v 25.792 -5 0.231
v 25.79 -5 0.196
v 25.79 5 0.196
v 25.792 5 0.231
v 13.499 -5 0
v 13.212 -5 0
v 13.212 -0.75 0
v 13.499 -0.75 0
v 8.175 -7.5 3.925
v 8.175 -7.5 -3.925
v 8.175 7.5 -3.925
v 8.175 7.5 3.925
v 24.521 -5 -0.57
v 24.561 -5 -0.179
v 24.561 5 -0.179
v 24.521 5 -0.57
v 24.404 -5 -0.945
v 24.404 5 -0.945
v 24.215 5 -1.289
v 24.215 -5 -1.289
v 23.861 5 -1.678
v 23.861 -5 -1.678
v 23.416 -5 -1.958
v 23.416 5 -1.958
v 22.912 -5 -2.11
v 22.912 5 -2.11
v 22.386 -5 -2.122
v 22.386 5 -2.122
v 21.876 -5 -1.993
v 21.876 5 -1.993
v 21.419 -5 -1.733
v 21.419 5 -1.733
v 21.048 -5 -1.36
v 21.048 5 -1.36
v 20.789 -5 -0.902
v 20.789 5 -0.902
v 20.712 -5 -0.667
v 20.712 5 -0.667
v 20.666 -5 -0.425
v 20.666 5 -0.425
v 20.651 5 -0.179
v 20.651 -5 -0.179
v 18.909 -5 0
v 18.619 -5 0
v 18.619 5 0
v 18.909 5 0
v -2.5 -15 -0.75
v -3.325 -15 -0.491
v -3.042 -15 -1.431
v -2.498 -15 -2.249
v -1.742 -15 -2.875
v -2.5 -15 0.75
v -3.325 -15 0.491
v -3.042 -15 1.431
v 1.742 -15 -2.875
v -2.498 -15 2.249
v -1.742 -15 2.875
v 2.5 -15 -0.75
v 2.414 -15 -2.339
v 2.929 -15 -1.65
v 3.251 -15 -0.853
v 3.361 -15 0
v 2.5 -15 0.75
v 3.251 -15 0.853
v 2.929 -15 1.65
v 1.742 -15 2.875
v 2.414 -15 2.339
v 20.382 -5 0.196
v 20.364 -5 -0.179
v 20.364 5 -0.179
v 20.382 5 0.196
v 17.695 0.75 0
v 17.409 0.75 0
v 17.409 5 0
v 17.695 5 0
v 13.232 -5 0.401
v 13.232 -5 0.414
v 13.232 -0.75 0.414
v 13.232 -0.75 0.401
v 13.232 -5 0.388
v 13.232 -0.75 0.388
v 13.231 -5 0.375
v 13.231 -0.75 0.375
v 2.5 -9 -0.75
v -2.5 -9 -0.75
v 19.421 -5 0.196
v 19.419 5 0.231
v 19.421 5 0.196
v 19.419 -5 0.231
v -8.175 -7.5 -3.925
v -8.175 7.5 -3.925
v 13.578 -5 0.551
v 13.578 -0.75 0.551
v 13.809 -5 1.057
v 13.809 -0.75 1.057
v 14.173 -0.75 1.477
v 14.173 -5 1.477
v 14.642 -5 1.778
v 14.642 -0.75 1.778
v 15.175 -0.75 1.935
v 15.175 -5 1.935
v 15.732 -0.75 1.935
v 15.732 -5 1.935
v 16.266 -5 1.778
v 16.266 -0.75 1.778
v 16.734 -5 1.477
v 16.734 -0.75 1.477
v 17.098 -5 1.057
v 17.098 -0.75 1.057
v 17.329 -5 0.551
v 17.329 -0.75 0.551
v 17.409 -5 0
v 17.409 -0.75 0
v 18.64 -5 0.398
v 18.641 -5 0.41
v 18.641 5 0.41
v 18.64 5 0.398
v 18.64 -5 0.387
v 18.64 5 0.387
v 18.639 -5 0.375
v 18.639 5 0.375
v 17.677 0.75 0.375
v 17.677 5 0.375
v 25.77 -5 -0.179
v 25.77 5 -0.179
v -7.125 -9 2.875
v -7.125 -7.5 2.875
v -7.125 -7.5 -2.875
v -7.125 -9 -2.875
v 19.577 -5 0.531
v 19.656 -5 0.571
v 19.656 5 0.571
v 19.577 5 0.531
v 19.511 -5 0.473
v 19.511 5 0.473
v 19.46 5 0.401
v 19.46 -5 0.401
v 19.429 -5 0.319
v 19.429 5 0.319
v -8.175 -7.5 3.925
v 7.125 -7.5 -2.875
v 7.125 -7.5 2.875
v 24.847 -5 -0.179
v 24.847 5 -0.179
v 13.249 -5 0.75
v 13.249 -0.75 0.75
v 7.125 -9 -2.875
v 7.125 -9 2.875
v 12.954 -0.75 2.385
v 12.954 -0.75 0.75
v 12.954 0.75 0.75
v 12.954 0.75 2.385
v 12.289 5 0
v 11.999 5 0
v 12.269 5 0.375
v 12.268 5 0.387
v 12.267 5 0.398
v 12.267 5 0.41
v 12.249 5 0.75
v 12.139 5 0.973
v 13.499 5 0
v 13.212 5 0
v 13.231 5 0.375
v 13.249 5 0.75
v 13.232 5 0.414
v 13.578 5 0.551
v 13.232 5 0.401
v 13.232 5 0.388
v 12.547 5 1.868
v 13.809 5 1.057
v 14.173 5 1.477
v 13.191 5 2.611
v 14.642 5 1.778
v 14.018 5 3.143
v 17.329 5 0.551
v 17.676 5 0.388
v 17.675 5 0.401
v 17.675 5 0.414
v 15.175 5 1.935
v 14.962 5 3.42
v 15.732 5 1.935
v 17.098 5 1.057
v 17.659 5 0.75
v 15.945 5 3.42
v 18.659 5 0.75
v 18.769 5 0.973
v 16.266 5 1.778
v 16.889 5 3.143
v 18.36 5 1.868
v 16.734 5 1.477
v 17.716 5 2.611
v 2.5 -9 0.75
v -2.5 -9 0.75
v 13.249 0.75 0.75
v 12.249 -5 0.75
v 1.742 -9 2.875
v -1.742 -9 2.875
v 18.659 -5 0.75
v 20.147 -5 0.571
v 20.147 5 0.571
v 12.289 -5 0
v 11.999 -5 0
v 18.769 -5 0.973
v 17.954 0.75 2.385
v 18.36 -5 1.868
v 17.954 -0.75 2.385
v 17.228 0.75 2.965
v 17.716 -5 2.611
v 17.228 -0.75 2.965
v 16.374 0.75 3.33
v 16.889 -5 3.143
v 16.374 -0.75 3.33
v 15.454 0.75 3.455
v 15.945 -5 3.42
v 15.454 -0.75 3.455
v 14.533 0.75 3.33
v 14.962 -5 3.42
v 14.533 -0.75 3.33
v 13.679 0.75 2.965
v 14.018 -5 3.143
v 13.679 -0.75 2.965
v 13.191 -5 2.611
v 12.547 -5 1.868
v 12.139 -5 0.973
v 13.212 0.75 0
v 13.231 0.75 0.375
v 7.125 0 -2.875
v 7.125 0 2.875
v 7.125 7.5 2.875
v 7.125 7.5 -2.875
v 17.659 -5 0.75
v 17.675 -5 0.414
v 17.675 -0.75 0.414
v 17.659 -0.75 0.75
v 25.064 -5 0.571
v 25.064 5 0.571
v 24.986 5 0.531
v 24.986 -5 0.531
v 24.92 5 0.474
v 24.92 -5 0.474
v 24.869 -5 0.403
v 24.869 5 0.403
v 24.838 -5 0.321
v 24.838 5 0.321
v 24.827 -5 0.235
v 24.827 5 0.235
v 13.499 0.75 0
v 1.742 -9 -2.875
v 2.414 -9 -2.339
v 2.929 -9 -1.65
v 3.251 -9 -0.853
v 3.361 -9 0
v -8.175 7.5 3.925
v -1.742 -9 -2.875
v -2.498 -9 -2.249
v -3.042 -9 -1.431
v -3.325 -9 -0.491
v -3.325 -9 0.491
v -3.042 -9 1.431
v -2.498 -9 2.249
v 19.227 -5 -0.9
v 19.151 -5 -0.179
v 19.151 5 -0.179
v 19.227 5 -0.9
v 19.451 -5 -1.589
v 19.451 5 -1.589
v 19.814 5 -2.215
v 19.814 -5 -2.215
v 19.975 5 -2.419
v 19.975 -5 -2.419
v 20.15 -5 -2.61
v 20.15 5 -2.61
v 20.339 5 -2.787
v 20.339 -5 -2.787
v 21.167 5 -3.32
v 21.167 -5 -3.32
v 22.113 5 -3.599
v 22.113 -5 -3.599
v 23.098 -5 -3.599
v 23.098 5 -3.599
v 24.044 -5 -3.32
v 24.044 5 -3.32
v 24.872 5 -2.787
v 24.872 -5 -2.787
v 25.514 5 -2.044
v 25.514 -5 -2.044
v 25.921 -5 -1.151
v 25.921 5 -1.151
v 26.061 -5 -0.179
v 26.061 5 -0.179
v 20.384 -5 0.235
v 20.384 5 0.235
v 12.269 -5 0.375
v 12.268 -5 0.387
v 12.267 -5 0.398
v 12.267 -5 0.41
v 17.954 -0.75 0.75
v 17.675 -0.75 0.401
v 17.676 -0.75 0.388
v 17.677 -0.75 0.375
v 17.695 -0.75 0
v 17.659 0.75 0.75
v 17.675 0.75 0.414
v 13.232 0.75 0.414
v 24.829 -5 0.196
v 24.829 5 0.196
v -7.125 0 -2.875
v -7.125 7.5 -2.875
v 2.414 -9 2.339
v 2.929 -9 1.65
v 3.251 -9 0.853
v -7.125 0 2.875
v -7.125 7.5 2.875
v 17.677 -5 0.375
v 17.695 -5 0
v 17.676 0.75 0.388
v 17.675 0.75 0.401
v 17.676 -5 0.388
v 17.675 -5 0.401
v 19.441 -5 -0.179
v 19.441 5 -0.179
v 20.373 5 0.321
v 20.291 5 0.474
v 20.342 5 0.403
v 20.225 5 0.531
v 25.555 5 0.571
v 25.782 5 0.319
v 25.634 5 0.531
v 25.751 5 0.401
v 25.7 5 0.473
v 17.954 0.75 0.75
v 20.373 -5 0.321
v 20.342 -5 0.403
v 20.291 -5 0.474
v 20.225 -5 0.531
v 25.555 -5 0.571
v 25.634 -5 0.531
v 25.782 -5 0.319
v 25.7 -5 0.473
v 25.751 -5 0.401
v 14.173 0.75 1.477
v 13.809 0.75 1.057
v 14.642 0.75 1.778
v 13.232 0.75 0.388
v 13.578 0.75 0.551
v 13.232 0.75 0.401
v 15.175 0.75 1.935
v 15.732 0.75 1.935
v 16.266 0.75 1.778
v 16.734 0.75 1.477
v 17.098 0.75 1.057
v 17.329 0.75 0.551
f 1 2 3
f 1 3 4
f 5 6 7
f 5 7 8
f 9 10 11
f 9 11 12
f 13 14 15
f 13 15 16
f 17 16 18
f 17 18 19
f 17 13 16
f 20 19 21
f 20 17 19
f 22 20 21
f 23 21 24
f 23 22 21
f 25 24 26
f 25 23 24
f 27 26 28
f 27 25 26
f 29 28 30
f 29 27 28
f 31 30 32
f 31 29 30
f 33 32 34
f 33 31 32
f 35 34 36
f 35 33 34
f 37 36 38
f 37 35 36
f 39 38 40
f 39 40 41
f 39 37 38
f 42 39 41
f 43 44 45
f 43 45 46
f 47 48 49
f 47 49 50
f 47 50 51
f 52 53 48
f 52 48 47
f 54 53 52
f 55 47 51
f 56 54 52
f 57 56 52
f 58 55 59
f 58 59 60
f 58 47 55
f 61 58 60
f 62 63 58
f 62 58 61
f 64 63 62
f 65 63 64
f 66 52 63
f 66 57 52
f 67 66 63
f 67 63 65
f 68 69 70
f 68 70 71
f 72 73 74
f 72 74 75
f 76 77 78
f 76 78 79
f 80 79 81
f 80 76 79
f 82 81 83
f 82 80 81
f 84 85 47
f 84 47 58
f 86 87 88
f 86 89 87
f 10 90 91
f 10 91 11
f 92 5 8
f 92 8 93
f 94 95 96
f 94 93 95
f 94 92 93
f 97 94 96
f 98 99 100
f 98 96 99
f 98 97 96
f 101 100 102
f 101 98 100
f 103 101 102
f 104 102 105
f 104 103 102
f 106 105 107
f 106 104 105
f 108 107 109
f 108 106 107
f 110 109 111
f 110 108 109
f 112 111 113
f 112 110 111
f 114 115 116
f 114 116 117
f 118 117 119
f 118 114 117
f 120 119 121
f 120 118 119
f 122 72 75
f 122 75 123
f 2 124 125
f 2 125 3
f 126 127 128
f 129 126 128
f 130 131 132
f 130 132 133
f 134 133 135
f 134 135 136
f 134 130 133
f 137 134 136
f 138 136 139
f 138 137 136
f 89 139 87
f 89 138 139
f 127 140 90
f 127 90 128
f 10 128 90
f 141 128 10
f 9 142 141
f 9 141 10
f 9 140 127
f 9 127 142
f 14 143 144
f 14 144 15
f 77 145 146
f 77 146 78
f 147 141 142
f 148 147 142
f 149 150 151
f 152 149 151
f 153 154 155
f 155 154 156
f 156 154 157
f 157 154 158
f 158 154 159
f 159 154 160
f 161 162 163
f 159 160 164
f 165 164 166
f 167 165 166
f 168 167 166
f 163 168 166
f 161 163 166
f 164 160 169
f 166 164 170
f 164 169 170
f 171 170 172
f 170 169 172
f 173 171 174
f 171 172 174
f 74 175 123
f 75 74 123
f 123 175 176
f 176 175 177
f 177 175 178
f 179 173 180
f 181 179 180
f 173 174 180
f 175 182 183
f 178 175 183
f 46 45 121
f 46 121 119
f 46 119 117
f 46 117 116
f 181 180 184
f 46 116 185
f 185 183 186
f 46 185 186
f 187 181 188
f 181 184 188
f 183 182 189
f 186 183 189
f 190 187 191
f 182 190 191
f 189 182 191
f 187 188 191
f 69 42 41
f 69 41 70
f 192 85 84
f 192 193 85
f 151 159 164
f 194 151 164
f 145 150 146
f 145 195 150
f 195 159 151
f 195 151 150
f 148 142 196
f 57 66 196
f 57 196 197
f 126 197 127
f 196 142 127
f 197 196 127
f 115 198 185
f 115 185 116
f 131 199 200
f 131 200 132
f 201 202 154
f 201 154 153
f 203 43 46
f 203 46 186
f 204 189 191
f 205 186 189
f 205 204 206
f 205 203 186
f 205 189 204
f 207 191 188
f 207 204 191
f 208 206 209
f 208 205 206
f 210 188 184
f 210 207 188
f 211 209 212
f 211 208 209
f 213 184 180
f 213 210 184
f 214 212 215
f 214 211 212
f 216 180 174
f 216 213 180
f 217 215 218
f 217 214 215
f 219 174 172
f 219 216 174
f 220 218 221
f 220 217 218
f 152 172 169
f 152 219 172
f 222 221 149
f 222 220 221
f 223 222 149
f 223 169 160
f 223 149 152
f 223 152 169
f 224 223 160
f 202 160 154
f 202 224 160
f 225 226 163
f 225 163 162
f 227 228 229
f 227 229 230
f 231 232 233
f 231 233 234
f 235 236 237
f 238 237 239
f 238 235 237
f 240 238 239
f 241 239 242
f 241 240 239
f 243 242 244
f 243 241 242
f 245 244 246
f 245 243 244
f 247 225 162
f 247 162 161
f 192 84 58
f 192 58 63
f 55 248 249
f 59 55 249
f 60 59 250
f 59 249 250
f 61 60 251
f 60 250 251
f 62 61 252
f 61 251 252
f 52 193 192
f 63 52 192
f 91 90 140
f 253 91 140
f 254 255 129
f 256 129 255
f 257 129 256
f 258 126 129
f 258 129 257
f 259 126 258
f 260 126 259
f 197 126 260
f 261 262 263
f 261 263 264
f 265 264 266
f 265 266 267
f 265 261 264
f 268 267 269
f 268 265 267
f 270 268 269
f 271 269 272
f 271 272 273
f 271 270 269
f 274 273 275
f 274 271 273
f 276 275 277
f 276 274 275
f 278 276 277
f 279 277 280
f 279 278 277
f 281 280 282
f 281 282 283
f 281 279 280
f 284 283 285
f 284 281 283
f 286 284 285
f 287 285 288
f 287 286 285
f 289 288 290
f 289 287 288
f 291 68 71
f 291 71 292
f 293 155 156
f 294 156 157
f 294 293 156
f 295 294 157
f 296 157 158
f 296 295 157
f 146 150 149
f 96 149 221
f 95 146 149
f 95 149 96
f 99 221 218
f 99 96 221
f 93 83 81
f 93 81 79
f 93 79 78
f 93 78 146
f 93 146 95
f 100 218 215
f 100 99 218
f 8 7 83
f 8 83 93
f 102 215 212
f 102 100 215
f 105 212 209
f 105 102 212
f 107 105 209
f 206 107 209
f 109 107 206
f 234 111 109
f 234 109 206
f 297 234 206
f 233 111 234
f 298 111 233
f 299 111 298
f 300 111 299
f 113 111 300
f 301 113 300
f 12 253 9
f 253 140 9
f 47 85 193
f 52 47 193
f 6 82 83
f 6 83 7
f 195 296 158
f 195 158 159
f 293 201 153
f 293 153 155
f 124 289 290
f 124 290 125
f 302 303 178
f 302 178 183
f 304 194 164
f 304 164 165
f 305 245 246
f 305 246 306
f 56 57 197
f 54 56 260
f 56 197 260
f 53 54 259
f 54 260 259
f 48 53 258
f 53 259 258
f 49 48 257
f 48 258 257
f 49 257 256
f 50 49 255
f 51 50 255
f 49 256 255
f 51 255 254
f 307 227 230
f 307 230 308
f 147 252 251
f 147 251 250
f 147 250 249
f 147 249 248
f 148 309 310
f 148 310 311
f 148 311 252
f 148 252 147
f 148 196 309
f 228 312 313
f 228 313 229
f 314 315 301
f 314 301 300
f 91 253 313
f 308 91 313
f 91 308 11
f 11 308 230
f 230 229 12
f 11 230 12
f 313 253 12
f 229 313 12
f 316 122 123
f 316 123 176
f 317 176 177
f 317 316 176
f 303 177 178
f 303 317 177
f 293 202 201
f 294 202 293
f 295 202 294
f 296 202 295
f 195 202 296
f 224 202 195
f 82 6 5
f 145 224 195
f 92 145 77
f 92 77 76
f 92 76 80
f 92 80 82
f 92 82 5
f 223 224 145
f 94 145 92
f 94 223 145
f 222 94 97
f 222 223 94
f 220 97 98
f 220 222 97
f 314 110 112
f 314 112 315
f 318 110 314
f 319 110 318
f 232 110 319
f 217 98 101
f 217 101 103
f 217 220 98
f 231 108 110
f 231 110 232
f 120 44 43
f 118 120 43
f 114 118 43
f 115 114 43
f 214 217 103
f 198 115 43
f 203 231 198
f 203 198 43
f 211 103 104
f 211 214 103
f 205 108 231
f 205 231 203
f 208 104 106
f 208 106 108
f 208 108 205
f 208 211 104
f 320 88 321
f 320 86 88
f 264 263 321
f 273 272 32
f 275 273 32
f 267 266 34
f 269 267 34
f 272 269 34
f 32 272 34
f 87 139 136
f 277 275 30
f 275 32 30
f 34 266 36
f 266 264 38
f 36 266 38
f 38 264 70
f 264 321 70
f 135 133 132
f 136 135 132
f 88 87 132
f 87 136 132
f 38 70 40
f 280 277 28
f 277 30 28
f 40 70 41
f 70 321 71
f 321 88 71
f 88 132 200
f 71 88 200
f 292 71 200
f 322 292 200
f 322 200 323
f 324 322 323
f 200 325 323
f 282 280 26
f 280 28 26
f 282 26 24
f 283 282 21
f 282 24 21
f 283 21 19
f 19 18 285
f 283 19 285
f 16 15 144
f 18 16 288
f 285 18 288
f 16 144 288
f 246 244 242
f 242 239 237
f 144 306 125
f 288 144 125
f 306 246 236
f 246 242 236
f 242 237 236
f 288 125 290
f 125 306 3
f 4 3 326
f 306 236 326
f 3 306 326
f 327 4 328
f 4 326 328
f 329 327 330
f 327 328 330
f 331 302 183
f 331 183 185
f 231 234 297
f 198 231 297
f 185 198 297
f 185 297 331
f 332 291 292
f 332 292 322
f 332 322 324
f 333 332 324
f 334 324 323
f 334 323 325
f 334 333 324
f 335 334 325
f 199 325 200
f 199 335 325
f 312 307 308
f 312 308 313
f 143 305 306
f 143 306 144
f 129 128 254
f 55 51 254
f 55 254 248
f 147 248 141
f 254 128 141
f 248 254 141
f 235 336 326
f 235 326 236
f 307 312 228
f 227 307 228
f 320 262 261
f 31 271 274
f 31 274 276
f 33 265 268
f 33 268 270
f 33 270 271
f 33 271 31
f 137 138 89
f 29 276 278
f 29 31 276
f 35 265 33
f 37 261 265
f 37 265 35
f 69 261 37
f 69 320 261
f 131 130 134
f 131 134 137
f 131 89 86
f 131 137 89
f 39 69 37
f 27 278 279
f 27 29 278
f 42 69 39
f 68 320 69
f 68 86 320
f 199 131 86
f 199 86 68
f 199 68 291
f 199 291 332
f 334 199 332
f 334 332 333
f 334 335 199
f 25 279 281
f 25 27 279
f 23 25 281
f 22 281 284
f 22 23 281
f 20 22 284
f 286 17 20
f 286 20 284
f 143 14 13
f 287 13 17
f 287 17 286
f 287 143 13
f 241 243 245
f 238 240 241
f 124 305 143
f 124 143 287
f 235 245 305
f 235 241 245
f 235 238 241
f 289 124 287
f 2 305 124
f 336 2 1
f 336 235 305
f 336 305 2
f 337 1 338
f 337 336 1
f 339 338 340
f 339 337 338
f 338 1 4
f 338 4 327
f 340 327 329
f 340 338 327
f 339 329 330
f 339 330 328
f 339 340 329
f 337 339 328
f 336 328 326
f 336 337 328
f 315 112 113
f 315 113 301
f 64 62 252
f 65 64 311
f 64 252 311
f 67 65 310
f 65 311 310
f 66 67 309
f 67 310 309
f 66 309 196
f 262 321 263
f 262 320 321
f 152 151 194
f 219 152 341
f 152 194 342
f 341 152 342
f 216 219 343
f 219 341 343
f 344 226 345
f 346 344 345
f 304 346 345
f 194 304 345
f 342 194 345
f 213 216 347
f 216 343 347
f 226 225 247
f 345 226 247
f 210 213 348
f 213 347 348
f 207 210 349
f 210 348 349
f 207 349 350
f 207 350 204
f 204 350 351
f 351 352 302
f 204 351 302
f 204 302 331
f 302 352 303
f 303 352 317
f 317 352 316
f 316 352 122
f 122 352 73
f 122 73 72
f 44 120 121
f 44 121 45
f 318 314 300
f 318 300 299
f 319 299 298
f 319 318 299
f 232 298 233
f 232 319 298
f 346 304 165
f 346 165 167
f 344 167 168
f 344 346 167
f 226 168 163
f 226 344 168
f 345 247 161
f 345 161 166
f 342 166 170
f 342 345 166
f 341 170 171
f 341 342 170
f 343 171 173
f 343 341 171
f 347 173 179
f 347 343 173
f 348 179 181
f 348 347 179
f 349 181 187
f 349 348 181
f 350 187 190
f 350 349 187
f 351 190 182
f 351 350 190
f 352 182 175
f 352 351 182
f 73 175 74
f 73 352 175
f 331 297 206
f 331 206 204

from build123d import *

# Parameters (mm, degrees)
F0_W     = 16.35
F0_H     = 7.85
F1_DEPTH = 7.5
F0_W_2   = 5
F0_H_2   = 1.5
F2_DEPTH = 9
F3_DEPTH = 15
F4_DEPTH = 5
F5_W     = 5
F5_H     = 1.5
F6_DEPTH = 9.752


with BuildPart() as f1:
    # F0 (on Front) → F1 (new body, symmetric)
    with BuildSketch(Plane.XZ):
        Rectangle(F0_W, F0_H)
        with BuildLine():
            Line((1.7415829263, 2.875), (7.125, 2.875))
            Line((7.125, 2.875), (7.125, -2.875))
            Line((7.125, -2.875), (1.7415829263, -2.875))
            ThreePointArc((1.7415829263, -2.875), (0, -3.3613592622), (-1.7415829263, -2.875))
            Line((-1.7415829263, -2.875), (-7.125, -2.875))
            Line((-7.125, -2.875), (-7.125, 2.875))
            Line((-7.125, 2.875), (-1.7415829263, 2.875))
            ThreePointArc((-1.7415829263, 2.875), (0, 3.3613592622), (1.7415829263, 2.875))
        make_face(mode=Mode.SUBTRACT)
        with BuildLine():
            ThreePointArc((-1.7415829263, -2.875), (0, -3.3613592622), (1.7415829263, -2.875))
            Line((1.7415829263, -2.875), (-1.7415829263, -2.875))
        make_face()
        with BuildLine():
            Line((-1.7415829263, 2.875), (1.7415829263, 2.875))
            ThreePointArc((1.7415829263, 2.875), (0, 3.3613592622), (-1.7415829263, 2.875))
        make_face()
    extrude(amount=F1_DEPTH, both=True)

    # F0 (on Front) → F2 (join)
    with BuildSketch(Plane.XZ):
        with BuildLine():
            Line((7.125, -2.875), (7.125, 2.875))
            Line((7.125, 2.875), (1.7415829263, 2.875))
            ThreePointArc((1.7415829263, 2.875), (2.928551006, 1.6499469975), (3.3613592622, 0))
            ThreePointArc((3.3613592622, 0), (2.928551006, -1.6499469975), (1.7415829263, -2.875))
            Line((1.7415829263, -2.875), (7.125, -2.875))
        make_face()
        with BuildLine():
            ThreePointArc((3.3613592622, 0), (2.928551006, 1.6499469975), (1.7415829263, 2.875))
            Line((1.7415829263, 2.875), (-1.7415829263, 2.875))
            ThreePointArc((-1.7415829263, 2.875), (-3.3613592622, 0), (-1.7415829263, -2.875))
            Line((-1.7415829263, -2.875), (1.7415829263, -2.875))
            ThreePointArc((1.7415829263, -2.875), (2.928551006, -1.6499469975), (3.3613592622, 0))
        make_face()
        Rectangle(F0_W_2, F0_H_2, mode=Mode.SUBTRACT)
        with BuildLine():
            ThreePointArc((-1.7415829263, -2.875), (-3.3613592622, 0), (-1.7415829263, 2.875))
            Line((-1.7415829263, 2.875), (-7.125, 2.875))
            Line((-7.125, 2.875), (-7.125, -2.875))
            Line((-7.125, -2.875), (-1.7415829263, -2.875))
        make_face()
        Rectangle(F0_W_2, F0_H_2)
    extrude(amount=F2_DEPTH)

    # F0 (on Front) → F3 (join)
    with BuildSketch(Plane.XZ):
        with BuildLine():
            ThreePointArc((3.3613592622, 0), (2.928551006, 1.6499469975), (1.7415829263, 2.875))
            Line((1.7415829263, 2.875), (-1.7415829263, 2.875))
            ThreePointArc((-1.7415829263, 2.875), (-3.3613592622, 0), (-1.7415829263, -2.875))
            Line((-1.7415829263, -2.875), (1.7415829263, -2.875))
            ThreePointArc((1.7415829263, -2.875), (2.928551006, -1.6499469975), (3.3613592622, 0))
        make_face()
        Rectangle(F0_W_2, F0_H_2, mode=Mode.SUBTRACT)
    extrude(amount=F3_DEPTH)


with BuildPart() as f4:
    # F0 (on Front) → F4 (new body, symmetric)
    with BuildSketch(Plane.XZ):
        with BuildLine():
            ThreePointArc((13.4986763668, 0), (15.4536763668, 1.955), (17.4086763668, 0))
            Line((17.4086763668, 0), (17.6948876991, 0))
            Line((17.6948876991, 0), (17.676782033, 0.375))
            ThreePointArc((17.676782033, 0.375), (17.6753254742, 0.3943374538), (17.6749123074, 0.4137252844))
            Line((17.6749123074, 0.4137252844), (17.6586763668, 0.75))
            Line((17.6586763668, 0.75), (18.6586763668, 0.75))
            Line((18.6586763668, 0.75), (18.6405108834, 0.4100266558))
            ThreePointArc((18.6405108834, 0.4100266558), (18.6400019662, 0.3924905201), (18.6386393362, 0.375))
            Line((18.6386393362, 0.375), (18.6186023057, 0))
            Line((18.6186023057, 0), (18.9086763668, 0))
            ThreePointArc((18.9086763668, 0), (15.4536763668, 3.455), (11.9986763668, 0))
            Line((11.9986763668, 0), (12.288750428, 0))
            Line((12.288750428, 0), (12.2687133974, 0.375))
            ThreePointArc((12.2687133974, 0.375), (12.2673507674, 0.3924905201), (12.2668418503, 0.4100266558))
            Line((12.2668418503, 0.4100266558), (12.2486763668, 0.75))
            Line((12.2486763668, 0.75), (13.2486763668, 0.75))
            Line((13.2486763668, 0.75), (13.2324404262, 0.4137252844))
            ThreePointArc((13.2324404262, 0.4137252844), (13.2320272594, 0.3943374538), (13.2305707006, 0.375))
            Line((13.2305707006, 0.375), (13.2124650345, 0))
            Line((13.2124650345, 0), (13.4986763668, 0))
        make_face()
    extrude(amount=F4_DEPTH, both=True)

    # F5 (on Top) → F6 (cut)
    with BuildSketch(Plane.XY):
        with Locations((15.4536763668, 0)):
            Rectangle(F5_W, F5_H)
    extrude(amount=F6_DEPTH, mode=Mode.SUBTRACT)


with BuildPart() as f4b:
    # F0 (on Front) → F4, piece 2 (new body, symmetric)
    with BuildSketch(Plane.XZ):
        with BuildLine():
            Line((19.440587234, -0.1789705101), (19.1505131729, -0.1789705101))
            ThreePointArc((19.1505131729, -0.1789705101), (19.3207003873, -1.2499653577), (19.8144957857, -2.2154495658))
            ThreePointArc((19.8144957857, -2.2154495658), (20.0606948092, -2.5158326147), (20.3390517964, -2.7866855691))
            ThreePointArc((20.3390517964, -2.7866855691), (22.6055131729, -3.6339705101), (24.8719745493, -2.7866855691))
            ThreePointArc((24.8719745493, -2.7866855691), (25.7493682153, -1.6118698339), (26.0605131729, -0.1789705101))
            Line((26.0605131729, -0.1789705101), (25.7704391117, -0.1789705101))
            Line((25.7704391117, -0.1789705101), (25.7904761423, 0.1960294899))
            Line((25.7904761423, 0.1960294899), (25.7923476894, 0.2310561457))
            ThreePointArc((25.7923476894, 0.2310561457), (25.7277150085, 0.4385446809), (25.5554458847, 0.5710294899))
            Line((25.5554458847, 0.5710294899), (25.0636490966, 0.5710294899))
            ThreePointArc((25.0636490966, 0.5710294899), (24.8924411463, 0.4400592427), (24.8267491135, 0.2347547743))
            Line((24.8267491135, 0.2347547743), (24.828618839, 0.1960294899))
            Line((24.828618839, 0.1960294899), (24.8467245052, -0.1789705101))
            Line((24.8467245052, -0.1789705101), (24.5605131729, -0.1789705101))
            ThreePointArc((24.5605131729, -0.1789705101), (24.4721322835, -0.7601401032), (24.2149805939, -1.2887631126))
            ThreePointArc((24.2149805939, -1.2887631126), (22.3860935077, -2.1216181906), (20.789052355, -0.9018087335))
            ThreePointArc((20.789052355, -0.9018087335), (20.6854603222, -0.5469678614), (20.6505131729, -0.1789705101))
            Line((20.6505131729, -0.1789705101), (20.3643018405, -0.1789705101))
            Line((20.3643018405, -0.1789705101), (20.3824075067, 0.1960294899))
            Line((20.3824075067, 0.1960294899), (20.3842772322, 0.2347547743))
            ThreePointArc((20.3842772322, 0.2347547743), (20.3185851995, 0.4400592427), (20.1473772491, 0.5710294899))
            Line((20.1473772491, 0.5710294899), (19.655580461, 0.5710294899))
            ThreePointArc((19.655580461, 0.5710294899), (19.4833113372, 0.4385446809), (19.4186786563, 0.2310561457))
            Line((19.4186786563, 0.2310561457), (19.4205502034, 0.1960294899))
            Line((19.4205502034, 0.1960294899), (19.440587234, -0.1789705101))
        make_face()
    extrude(amount=F4_DEPTH, both=True)


solid = Compound([f1.part, f4.part, f4b.part])
